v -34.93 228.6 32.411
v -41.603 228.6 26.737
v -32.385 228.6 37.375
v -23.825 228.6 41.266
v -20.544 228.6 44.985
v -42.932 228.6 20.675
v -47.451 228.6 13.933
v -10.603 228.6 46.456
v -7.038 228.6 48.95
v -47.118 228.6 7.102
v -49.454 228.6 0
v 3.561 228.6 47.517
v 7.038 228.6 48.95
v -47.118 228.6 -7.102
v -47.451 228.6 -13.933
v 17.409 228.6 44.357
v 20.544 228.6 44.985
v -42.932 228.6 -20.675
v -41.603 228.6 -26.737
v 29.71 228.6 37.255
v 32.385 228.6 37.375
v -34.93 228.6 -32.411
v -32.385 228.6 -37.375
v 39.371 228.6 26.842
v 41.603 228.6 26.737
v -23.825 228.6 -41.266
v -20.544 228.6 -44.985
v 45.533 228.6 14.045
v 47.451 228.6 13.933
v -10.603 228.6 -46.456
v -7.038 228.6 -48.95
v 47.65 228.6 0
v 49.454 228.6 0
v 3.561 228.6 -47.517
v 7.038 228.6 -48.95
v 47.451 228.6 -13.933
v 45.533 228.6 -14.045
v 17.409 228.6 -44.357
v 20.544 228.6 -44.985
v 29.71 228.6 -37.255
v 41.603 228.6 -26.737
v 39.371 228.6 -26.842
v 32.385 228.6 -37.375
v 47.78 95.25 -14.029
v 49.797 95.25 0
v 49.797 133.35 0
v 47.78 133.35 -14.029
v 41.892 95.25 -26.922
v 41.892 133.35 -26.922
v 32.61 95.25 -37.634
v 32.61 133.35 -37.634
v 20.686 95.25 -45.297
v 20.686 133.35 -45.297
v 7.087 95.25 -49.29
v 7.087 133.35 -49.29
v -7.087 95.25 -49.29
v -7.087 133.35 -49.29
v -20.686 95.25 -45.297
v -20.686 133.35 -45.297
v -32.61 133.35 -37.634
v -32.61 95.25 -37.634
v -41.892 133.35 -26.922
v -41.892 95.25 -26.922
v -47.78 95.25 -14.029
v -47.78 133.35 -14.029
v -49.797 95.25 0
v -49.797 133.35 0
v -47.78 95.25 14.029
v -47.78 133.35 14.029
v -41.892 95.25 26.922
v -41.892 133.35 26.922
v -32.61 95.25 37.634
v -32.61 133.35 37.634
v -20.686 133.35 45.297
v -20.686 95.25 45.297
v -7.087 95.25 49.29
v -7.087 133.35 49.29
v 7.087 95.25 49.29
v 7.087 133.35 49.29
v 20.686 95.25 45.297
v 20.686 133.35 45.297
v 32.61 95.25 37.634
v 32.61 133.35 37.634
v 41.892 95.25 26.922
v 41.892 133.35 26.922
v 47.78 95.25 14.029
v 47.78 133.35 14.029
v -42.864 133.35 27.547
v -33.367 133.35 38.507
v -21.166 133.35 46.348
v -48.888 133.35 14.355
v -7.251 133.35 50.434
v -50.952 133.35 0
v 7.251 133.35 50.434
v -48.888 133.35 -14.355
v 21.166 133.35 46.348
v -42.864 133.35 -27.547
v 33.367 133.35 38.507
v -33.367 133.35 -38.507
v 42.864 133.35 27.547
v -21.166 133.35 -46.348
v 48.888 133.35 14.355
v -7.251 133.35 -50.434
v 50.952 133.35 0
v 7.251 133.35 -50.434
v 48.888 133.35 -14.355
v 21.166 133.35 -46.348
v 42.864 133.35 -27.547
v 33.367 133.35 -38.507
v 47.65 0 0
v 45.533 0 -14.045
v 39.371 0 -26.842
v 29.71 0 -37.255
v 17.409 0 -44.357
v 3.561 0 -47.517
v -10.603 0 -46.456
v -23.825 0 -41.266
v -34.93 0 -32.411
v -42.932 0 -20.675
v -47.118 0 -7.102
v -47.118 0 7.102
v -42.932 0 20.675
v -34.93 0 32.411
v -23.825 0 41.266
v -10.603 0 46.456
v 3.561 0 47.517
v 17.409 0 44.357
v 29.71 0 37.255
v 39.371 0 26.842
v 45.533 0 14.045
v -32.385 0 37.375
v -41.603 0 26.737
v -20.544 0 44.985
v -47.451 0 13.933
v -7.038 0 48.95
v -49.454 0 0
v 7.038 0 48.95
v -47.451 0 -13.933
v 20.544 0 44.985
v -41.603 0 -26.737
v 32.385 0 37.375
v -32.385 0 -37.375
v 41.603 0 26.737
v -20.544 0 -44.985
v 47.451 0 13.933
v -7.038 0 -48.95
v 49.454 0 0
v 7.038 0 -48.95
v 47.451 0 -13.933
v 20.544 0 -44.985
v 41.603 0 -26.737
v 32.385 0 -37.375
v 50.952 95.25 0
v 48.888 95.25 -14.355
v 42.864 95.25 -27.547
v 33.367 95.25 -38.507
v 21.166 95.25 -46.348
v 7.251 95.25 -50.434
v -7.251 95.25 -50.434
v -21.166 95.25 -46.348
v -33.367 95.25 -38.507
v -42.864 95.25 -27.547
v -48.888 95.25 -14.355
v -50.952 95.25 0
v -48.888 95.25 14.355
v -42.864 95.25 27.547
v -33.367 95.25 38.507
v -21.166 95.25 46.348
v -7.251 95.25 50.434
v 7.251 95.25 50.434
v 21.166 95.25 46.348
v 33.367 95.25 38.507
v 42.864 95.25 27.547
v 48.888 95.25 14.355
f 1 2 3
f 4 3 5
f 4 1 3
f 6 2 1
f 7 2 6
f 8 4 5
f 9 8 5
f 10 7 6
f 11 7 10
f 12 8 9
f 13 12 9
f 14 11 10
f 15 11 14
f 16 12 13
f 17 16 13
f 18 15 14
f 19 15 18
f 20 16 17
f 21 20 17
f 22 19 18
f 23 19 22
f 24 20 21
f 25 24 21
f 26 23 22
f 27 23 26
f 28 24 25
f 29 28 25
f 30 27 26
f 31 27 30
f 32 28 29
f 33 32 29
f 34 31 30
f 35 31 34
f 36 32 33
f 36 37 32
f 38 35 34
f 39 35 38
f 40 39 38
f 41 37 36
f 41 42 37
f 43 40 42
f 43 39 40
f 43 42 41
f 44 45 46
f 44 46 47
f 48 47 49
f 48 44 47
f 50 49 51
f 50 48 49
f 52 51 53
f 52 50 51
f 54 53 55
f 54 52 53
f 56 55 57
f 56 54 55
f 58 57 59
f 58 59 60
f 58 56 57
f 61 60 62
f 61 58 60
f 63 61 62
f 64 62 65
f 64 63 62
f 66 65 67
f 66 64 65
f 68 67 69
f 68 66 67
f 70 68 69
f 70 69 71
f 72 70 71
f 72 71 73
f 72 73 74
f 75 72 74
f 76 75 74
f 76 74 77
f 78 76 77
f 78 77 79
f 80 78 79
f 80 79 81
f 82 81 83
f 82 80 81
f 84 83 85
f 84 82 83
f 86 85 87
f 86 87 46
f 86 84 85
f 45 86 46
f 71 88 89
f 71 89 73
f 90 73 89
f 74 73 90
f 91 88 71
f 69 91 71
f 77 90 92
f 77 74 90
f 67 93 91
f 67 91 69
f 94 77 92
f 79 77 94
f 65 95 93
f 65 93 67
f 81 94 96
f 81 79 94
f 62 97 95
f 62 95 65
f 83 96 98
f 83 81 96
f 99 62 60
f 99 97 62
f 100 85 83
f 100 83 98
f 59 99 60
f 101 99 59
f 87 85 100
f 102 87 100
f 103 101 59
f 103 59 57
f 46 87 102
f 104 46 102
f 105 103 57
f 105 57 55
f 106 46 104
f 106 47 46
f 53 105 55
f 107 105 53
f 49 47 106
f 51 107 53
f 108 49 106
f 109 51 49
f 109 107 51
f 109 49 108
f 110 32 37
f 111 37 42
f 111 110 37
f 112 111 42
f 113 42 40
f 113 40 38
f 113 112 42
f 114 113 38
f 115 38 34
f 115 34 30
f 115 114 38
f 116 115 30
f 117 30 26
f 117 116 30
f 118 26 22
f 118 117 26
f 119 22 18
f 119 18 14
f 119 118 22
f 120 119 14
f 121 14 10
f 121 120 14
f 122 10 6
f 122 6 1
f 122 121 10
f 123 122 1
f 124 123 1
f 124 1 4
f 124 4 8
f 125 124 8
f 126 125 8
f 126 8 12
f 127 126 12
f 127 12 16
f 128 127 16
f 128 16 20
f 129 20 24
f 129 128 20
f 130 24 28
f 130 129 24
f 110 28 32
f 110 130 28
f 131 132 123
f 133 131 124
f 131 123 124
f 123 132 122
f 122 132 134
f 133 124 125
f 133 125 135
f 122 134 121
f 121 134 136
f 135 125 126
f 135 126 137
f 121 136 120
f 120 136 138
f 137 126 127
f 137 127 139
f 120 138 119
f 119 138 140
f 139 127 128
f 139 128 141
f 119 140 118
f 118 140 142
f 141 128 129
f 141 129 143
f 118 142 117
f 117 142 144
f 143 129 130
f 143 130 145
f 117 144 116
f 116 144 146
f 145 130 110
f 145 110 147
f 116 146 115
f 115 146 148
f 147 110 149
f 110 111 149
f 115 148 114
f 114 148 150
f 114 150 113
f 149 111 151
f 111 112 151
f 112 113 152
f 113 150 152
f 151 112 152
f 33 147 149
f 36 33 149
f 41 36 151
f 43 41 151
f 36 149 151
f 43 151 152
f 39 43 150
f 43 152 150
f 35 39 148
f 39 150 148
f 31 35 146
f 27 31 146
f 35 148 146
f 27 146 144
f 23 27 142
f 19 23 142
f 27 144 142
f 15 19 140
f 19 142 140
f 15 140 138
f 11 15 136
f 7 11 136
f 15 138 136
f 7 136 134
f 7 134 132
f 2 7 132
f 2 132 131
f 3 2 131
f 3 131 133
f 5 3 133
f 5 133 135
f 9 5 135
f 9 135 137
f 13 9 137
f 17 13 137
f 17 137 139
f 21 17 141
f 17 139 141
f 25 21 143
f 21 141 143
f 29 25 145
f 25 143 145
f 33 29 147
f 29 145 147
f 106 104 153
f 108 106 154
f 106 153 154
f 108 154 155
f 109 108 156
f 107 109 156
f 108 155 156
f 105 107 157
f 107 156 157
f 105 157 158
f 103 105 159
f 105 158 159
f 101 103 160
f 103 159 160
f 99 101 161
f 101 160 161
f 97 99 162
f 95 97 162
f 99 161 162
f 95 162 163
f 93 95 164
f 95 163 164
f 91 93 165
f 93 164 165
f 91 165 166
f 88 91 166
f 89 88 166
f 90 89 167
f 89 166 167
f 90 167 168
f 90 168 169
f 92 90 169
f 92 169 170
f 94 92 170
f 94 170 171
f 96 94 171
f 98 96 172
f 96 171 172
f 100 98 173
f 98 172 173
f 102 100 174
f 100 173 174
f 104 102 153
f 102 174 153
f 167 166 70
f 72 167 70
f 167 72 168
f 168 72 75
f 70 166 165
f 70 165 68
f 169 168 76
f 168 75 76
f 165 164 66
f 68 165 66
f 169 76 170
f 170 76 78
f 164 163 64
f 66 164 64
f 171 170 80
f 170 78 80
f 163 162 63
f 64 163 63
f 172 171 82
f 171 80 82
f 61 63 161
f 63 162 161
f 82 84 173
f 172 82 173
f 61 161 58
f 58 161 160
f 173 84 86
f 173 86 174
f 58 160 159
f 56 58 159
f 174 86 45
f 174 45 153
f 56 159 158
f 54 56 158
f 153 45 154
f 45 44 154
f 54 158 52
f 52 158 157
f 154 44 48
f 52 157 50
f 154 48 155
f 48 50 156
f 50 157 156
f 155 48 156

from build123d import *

# Parameters (mm, degrees)
SKETCH1_R           = 49.4538
SKETCH1_R_2         = 47.6504
BOSS_EXTRUDE1_DEPTH = 228.6
BOSS_EXTRUDE2_START = -133.35
SKETCH2_R           = 50.9524
SKETCH2_R_2         = 49.7967
BOSS_EXTRUDE2_DEPTH = 38.1


with BuildPart() as part:
    # Sketch1 → Boss-Extrude1 (new body)
    with BuildSketch(Plane(origin=(0, 0, 0), x_dir=(1, 0, 0), z_dir=(0, 1, 0))):
        Circle(SKETCH1_R)
        Circle(SKETCH1_R_2, mode=Mode.SUBTRACT)
    extrude(amount=BOSS_EXTRUDE1_DEPTH)


with BuildPart() as body_2:
    # Sketch2 → Boss-Extrude2 (new body)
    with BuildSketch(Plane(origin=(0, 228.6, 0), x_dir=(1, 0, 0), z_dir=(0, 1, 0)).offset(BOSS_EXTRUDE2_START)):
        Circle(SKETCH2_R)
        Circle(SKETCH2_R_2, mode=Mode.SUBTRACT)
    extrude(amount=BOSS_EXTRUDE2_DEPTH)


solid = Compound([part.part, body_2.part])
